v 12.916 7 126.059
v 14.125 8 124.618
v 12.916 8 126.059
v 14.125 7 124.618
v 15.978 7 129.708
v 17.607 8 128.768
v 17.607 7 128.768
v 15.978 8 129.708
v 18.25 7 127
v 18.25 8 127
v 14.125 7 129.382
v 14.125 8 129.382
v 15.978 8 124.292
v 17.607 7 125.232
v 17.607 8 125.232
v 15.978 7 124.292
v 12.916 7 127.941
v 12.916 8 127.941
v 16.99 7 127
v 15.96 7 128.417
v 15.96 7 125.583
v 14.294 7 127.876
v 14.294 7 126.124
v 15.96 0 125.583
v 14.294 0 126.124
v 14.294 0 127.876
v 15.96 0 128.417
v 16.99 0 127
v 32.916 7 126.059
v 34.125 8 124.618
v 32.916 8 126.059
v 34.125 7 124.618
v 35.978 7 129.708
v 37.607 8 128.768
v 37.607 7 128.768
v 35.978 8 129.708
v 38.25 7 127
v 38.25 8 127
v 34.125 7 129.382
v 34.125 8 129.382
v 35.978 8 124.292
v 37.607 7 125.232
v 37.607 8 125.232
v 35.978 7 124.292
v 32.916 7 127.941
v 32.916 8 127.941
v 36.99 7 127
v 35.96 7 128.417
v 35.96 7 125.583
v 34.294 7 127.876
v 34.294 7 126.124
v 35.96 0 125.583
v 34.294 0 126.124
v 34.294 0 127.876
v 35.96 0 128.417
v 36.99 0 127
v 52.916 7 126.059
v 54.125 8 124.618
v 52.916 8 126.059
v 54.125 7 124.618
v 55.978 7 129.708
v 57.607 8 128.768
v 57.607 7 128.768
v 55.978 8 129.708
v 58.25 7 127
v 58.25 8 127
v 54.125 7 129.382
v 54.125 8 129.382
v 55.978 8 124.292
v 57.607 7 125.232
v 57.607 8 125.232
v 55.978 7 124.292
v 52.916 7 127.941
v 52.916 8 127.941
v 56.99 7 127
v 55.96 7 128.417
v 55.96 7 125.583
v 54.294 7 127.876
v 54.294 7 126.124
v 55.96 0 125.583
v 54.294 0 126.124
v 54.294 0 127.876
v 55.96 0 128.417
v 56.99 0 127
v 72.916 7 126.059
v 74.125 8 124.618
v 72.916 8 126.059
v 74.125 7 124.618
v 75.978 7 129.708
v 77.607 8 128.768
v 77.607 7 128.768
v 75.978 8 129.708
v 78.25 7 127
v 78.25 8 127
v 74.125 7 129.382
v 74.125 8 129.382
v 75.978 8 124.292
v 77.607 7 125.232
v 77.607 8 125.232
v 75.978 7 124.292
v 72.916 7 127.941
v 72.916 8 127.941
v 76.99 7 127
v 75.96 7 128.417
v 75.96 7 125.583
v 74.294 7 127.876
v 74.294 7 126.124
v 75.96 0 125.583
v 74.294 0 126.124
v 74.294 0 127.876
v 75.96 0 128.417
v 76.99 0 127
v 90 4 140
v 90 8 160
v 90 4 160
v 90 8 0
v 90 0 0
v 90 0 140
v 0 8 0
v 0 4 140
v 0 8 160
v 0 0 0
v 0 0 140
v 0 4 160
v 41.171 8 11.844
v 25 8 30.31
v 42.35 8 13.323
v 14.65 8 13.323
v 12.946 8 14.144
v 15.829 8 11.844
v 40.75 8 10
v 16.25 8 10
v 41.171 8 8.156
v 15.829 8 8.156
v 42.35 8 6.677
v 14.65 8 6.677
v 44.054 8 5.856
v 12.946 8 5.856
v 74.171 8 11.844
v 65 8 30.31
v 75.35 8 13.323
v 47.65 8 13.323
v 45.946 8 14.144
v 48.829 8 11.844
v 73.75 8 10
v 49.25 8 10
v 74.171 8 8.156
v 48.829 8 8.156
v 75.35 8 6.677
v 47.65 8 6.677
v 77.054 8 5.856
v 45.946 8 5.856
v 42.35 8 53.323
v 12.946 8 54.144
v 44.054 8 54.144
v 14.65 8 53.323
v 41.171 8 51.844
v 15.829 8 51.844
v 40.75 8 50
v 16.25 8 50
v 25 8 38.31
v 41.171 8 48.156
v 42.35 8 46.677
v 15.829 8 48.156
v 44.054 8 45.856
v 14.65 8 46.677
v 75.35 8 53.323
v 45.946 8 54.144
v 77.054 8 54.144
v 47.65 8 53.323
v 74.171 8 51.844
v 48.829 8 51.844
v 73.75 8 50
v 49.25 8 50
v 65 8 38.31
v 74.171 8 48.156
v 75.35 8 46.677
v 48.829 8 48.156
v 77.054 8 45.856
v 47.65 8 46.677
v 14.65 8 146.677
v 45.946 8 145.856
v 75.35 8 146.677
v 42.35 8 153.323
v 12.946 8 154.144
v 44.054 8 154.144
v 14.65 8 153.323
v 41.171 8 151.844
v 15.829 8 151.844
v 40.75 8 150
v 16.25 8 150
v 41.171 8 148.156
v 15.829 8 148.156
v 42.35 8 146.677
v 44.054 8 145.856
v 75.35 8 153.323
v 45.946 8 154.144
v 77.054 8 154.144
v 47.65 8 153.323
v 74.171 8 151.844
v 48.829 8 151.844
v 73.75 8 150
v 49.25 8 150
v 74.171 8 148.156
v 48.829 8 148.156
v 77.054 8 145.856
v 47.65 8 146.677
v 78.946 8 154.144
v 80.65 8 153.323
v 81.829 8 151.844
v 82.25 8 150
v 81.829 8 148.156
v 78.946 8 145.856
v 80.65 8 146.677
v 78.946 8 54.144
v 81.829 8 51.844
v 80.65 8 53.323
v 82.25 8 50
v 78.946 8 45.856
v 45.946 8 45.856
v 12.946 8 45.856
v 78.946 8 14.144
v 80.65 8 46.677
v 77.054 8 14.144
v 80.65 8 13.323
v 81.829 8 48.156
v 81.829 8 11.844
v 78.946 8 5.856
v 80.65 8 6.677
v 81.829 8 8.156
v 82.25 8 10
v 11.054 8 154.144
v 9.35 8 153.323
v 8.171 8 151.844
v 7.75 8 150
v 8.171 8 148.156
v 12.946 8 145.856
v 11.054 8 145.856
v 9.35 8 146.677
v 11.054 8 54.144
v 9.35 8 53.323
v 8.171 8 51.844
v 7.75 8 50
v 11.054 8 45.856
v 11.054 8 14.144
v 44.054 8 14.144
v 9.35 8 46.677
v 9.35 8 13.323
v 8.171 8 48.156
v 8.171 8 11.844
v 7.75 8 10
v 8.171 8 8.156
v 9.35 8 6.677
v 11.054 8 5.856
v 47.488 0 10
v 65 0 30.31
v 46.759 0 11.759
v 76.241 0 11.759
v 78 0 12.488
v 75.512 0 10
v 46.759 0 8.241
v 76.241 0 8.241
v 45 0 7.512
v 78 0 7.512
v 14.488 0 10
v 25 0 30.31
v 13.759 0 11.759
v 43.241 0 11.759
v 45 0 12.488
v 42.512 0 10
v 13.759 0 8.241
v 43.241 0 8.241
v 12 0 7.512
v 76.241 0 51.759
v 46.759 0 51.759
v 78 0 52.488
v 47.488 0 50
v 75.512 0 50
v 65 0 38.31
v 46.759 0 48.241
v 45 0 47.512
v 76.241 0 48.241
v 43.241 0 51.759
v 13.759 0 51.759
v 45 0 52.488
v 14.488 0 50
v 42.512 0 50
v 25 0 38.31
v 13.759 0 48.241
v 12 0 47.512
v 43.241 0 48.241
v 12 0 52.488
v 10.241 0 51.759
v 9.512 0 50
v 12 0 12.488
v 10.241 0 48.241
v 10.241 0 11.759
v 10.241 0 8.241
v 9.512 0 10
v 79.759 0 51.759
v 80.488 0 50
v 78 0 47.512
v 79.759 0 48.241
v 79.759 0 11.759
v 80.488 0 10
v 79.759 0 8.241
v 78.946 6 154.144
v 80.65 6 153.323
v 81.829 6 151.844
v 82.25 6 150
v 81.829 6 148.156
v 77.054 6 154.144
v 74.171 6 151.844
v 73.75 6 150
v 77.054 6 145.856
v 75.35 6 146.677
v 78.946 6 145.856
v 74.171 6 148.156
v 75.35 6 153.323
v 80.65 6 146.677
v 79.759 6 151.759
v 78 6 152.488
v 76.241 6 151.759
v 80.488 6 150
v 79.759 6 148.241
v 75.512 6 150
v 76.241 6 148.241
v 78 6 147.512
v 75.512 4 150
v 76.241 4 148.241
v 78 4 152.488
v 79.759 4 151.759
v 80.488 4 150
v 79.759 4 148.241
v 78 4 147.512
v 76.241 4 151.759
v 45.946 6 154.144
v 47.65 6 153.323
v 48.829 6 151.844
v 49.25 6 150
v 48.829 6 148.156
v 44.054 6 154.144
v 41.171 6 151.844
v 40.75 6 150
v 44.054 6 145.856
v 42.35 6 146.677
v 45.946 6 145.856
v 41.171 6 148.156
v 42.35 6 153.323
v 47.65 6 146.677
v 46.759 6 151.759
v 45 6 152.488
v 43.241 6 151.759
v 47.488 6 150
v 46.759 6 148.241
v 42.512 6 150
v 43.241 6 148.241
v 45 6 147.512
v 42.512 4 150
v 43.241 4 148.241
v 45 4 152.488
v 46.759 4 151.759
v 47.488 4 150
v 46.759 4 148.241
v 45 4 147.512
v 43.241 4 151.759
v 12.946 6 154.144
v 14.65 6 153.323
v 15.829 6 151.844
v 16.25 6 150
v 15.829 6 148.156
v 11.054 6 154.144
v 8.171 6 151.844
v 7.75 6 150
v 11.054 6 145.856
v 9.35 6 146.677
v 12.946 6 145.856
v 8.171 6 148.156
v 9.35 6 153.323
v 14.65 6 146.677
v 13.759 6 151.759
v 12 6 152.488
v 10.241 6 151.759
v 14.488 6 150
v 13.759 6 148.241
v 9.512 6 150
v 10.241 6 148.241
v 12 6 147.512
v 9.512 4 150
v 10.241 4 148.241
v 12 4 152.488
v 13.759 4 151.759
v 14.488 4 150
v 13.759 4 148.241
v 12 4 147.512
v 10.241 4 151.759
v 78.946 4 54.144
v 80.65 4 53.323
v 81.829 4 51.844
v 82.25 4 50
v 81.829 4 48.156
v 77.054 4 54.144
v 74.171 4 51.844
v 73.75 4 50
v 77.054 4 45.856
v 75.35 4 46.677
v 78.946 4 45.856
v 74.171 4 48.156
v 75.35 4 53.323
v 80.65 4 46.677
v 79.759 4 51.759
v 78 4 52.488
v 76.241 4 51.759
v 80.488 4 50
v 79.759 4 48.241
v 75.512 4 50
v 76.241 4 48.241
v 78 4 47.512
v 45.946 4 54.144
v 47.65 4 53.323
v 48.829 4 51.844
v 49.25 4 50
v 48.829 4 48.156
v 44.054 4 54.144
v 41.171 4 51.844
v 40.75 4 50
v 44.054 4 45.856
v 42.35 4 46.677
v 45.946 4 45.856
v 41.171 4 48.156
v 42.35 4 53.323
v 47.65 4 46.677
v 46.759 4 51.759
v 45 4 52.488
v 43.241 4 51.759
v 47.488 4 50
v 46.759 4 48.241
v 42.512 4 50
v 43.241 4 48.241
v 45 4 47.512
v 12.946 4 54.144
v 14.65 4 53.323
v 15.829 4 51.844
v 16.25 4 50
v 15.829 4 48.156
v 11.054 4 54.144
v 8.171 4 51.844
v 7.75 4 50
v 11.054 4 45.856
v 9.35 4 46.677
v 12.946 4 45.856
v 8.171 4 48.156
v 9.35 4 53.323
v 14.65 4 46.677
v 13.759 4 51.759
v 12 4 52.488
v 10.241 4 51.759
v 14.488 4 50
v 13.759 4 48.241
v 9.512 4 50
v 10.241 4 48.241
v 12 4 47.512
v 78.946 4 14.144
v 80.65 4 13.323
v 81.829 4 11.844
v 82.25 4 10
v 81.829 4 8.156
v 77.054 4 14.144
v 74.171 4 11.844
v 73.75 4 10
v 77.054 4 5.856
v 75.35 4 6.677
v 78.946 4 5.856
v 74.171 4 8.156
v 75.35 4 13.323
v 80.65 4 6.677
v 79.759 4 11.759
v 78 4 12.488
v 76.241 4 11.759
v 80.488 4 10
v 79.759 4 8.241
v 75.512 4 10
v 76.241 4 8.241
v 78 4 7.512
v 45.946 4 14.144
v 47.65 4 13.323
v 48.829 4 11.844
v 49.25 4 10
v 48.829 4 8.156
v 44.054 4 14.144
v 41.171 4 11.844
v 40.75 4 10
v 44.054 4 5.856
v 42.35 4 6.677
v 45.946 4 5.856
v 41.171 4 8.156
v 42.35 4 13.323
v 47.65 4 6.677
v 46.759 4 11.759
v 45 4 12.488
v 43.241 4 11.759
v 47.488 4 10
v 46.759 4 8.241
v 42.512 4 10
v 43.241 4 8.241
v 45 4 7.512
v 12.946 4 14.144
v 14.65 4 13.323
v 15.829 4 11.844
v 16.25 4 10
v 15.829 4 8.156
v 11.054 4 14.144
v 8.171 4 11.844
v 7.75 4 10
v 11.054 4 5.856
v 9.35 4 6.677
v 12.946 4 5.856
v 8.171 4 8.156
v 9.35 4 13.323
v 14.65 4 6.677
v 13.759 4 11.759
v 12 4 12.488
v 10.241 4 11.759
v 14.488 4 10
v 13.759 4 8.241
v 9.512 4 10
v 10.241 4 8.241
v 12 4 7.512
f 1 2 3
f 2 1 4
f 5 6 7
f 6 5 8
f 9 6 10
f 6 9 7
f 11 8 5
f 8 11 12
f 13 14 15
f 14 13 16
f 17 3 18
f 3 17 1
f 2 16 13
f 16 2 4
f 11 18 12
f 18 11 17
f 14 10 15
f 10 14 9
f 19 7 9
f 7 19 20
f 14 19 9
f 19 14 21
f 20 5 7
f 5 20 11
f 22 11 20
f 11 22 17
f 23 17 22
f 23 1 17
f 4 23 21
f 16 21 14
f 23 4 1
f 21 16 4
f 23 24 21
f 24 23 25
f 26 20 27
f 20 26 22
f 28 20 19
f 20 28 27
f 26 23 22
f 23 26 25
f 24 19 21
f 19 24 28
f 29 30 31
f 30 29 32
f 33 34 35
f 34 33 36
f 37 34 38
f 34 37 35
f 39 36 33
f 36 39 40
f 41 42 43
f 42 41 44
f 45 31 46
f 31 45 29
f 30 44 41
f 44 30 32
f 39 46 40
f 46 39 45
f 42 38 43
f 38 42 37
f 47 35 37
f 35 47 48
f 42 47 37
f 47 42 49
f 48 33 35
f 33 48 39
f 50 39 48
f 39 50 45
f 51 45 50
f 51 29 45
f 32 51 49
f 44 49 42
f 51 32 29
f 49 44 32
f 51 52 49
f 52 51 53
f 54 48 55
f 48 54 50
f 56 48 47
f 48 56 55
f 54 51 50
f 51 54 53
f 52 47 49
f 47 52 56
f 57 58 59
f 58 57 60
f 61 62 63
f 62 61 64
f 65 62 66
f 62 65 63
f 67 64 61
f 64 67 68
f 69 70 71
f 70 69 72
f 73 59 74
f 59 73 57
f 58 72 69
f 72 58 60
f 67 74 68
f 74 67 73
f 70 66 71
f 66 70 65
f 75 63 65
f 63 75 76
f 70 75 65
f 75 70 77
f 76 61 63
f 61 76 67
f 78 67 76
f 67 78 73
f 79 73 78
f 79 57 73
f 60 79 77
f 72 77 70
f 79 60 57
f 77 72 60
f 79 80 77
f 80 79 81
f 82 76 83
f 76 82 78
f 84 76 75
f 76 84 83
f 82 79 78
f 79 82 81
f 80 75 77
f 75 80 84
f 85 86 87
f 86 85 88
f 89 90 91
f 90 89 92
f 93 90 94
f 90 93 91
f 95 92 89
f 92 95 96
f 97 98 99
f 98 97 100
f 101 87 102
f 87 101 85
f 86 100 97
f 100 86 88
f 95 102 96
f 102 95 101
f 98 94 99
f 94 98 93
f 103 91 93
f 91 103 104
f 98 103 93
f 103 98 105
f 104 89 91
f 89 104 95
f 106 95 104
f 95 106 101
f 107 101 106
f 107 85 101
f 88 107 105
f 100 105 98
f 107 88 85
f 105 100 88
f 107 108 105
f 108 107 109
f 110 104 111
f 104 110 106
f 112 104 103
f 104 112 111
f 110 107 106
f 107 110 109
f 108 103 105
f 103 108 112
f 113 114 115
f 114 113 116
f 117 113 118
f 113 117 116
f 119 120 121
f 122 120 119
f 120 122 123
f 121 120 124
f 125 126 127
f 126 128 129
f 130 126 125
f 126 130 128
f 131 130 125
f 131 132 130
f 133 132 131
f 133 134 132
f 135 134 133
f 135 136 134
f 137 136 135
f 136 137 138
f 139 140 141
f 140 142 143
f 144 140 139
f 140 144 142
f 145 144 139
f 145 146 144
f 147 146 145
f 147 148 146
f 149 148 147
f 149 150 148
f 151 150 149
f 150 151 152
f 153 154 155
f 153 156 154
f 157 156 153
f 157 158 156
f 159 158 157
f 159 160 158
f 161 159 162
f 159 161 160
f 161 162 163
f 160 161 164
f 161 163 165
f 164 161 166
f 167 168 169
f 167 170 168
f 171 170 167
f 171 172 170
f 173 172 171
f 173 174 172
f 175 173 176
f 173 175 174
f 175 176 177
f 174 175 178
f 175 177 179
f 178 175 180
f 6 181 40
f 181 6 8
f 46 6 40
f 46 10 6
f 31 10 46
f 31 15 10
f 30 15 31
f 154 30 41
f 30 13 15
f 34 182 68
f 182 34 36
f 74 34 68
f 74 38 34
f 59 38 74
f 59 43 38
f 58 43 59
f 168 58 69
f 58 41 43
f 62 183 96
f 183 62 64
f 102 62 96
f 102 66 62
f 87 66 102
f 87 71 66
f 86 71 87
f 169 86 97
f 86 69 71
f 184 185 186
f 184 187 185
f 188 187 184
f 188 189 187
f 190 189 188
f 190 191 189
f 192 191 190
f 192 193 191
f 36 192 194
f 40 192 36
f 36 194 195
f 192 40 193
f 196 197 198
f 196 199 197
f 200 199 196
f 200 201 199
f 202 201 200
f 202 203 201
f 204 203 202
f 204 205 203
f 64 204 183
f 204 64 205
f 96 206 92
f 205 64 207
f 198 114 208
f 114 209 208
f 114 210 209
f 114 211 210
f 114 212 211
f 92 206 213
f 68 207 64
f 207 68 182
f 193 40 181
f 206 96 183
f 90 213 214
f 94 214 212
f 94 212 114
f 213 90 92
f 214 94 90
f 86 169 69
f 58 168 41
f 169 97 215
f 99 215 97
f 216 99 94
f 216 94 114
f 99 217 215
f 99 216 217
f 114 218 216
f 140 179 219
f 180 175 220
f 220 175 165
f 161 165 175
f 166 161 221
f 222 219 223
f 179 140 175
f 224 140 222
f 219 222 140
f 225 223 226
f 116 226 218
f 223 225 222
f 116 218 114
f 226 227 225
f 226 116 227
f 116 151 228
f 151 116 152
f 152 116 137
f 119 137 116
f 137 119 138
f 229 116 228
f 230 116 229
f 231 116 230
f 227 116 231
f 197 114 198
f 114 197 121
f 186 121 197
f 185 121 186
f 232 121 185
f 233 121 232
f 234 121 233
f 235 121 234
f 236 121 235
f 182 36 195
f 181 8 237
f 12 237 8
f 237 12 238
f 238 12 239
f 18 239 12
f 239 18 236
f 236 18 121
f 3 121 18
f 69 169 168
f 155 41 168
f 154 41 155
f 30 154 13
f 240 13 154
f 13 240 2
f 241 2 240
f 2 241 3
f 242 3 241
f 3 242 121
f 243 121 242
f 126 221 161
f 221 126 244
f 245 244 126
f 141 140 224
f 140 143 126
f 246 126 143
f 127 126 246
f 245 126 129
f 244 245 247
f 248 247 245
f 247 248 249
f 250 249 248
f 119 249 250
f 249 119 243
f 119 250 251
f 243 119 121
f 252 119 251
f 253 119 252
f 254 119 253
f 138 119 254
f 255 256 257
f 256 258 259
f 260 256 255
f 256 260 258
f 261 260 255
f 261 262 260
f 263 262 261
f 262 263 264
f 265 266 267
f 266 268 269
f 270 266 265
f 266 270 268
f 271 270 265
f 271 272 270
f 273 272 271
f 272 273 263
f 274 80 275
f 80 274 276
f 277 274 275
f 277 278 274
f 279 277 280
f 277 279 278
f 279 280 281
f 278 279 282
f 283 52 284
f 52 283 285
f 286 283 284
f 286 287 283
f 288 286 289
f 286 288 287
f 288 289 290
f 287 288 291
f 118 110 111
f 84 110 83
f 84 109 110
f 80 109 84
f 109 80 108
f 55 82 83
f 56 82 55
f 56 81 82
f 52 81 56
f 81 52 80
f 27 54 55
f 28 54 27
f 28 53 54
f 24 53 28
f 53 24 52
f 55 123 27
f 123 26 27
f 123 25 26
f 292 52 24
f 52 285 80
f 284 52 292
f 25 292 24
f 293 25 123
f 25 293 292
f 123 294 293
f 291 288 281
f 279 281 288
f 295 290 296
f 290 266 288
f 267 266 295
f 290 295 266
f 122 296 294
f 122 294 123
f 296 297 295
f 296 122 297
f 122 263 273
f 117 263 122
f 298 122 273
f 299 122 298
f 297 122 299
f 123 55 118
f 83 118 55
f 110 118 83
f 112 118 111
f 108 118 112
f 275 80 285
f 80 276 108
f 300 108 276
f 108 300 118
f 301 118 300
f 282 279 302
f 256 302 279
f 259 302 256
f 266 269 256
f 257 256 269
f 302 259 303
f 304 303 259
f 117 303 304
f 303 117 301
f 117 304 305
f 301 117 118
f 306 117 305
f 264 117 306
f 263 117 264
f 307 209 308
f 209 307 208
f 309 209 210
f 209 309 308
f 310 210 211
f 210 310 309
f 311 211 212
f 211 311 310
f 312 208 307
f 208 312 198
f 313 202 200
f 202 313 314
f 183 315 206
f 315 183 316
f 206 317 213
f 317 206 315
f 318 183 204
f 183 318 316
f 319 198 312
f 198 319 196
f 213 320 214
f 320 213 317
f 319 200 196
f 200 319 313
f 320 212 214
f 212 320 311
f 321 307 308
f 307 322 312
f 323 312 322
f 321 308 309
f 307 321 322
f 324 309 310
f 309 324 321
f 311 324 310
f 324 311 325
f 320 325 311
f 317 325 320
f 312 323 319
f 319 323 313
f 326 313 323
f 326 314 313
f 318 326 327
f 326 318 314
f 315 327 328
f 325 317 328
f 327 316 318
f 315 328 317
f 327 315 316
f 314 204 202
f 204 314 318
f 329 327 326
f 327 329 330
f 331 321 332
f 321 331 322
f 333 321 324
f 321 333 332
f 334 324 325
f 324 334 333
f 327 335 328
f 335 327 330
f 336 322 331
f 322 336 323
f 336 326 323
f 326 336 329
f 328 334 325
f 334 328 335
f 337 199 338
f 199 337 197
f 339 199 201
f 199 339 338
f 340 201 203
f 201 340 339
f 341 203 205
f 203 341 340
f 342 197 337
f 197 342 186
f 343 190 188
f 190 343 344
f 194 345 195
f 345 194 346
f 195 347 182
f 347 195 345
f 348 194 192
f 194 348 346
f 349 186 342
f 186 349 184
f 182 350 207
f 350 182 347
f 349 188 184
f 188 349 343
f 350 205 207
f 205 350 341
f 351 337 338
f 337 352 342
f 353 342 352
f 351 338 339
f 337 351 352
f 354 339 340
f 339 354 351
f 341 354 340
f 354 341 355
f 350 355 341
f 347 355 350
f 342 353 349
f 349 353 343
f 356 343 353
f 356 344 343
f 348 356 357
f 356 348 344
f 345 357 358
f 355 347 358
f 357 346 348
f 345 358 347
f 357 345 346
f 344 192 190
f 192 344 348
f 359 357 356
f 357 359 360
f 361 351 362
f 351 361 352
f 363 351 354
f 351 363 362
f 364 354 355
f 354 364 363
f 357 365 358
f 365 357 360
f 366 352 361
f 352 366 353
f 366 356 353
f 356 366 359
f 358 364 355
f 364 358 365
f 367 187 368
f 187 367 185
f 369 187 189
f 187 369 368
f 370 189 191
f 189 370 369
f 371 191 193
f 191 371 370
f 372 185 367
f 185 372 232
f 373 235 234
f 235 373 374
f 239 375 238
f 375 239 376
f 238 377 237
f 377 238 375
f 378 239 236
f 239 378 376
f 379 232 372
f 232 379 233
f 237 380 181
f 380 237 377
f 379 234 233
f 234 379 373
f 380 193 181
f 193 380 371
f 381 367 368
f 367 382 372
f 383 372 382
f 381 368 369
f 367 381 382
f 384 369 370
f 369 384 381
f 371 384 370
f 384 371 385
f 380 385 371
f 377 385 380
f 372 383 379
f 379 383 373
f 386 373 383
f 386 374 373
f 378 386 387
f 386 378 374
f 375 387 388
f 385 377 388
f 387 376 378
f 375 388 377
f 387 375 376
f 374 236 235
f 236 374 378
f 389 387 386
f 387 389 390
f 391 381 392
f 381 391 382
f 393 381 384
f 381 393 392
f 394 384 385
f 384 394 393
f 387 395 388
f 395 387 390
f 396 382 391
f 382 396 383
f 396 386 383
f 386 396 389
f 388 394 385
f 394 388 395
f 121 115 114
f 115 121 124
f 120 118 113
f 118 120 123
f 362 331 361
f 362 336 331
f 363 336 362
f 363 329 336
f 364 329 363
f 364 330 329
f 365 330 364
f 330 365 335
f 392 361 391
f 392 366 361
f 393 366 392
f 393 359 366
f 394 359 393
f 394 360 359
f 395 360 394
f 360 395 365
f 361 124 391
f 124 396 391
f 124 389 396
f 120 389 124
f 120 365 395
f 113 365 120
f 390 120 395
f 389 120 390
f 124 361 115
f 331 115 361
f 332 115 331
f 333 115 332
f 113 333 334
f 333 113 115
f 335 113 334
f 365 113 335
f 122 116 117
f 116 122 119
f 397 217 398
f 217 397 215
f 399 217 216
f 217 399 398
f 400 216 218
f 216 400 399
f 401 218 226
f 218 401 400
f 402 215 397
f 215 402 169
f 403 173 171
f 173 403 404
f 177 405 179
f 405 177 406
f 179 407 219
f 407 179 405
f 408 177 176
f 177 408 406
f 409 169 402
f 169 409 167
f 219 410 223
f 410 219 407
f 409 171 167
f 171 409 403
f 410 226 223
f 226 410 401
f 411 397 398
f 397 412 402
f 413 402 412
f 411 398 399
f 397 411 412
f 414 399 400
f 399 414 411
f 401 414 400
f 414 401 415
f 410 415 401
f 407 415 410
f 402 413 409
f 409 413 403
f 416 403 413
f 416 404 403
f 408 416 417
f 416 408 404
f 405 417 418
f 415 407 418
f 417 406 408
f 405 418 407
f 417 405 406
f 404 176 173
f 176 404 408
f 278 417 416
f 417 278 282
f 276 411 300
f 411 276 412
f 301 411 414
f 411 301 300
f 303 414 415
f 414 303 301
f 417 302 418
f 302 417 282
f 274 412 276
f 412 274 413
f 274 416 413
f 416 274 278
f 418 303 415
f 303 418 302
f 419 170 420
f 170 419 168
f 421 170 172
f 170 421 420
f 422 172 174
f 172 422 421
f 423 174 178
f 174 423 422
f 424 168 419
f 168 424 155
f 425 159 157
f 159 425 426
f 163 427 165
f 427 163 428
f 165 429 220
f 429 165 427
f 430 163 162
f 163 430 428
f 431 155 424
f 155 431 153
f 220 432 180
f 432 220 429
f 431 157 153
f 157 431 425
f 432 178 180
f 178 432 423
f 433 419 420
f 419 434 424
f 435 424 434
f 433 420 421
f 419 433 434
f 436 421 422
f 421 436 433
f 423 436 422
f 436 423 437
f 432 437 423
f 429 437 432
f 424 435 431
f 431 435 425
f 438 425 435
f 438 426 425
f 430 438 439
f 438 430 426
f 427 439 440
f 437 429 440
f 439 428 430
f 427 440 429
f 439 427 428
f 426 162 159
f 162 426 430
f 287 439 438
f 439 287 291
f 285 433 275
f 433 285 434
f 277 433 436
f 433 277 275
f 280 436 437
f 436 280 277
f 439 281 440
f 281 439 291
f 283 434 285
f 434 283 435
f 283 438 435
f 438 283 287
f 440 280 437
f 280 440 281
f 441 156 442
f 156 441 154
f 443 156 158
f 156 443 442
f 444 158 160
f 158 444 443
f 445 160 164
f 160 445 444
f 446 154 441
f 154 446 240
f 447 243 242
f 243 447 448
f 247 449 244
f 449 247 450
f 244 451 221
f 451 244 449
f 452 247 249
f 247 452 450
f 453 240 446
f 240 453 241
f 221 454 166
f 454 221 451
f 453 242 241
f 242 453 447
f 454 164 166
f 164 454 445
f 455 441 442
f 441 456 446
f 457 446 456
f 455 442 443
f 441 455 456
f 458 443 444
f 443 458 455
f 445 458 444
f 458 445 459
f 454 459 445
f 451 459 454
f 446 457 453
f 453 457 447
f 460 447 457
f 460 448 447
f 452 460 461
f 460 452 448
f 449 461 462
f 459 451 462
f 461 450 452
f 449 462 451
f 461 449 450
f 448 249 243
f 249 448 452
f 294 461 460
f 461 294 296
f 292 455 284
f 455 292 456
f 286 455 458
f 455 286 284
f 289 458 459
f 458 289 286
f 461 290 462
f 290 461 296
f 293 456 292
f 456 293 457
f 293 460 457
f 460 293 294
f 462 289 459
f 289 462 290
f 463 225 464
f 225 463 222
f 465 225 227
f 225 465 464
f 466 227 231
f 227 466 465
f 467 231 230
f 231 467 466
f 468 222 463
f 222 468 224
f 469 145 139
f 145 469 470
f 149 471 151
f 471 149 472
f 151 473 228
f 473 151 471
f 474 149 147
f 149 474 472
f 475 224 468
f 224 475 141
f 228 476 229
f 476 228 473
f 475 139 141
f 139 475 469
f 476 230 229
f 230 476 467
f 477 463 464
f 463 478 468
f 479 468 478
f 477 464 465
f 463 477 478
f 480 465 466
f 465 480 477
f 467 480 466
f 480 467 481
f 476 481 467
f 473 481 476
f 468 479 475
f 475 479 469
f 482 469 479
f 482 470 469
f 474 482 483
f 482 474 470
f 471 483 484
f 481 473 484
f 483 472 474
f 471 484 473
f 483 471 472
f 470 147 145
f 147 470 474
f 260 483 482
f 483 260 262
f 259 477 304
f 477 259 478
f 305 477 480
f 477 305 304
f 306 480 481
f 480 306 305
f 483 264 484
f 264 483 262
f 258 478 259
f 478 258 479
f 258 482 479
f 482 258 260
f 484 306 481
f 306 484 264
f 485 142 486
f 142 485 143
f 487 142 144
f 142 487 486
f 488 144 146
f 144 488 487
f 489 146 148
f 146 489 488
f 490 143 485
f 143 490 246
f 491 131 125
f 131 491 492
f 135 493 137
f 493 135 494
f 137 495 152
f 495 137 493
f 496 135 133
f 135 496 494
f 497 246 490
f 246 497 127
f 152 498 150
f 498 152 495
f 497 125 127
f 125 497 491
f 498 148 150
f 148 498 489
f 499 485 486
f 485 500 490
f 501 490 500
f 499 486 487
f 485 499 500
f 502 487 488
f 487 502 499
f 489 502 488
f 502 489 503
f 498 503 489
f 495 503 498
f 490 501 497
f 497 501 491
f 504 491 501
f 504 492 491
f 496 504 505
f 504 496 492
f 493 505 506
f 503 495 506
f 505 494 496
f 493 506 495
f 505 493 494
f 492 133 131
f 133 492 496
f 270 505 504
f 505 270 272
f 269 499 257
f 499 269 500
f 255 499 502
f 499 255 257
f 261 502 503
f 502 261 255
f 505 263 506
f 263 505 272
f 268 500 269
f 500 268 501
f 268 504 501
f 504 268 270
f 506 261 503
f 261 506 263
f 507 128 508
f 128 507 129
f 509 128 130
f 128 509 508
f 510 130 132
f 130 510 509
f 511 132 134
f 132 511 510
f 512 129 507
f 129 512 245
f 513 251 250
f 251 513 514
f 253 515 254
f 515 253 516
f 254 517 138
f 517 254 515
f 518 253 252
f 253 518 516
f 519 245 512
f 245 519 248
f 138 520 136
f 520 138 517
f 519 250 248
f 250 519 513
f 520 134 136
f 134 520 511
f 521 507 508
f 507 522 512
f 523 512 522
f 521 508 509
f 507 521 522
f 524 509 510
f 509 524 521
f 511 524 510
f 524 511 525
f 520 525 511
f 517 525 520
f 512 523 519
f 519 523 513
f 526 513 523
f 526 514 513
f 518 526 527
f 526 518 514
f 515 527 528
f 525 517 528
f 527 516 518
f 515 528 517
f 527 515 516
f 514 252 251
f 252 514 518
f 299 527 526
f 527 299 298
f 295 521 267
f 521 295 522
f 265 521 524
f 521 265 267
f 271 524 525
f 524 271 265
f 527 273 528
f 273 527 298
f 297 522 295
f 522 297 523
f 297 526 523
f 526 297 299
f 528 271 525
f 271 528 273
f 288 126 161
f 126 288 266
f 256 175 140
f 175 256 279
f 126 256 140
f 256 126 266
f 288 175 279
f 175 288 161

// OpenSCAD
// file: grid.scad
module grid(gridX=100,gridY=100,borderX=10,borderY=10,meshSolid=.5,meshSpace=2,thickness=1.5)
{
//-------------------------------------------------
	meshX=gridX-(borderX*2);
	meshY=gridY-(borderY*2);
	nX=meshX/(meshSolid+meshSpace);
	nY=meshY/(meshSolid+meshSpace);

	difference() {
		cube (size=[gridX,gridY,thickness],center=true);
		cube (size=[meshX,meshY,thickness],center=true);
		}

	for (i=[0:nX]) {
	 	 translate([-(meshX/2)+i*(meshSolid+meshSpace),-meshY/2,-thickness/2]) cube(size=[meshSolid,meshY,thickness],center=false);
		 }

	for (i=[0:nY]) {
	 	translate([-meshX/2,-(meshY/2)+i*(meshSolid+meshSpace),-thickness/2]) cube(size=[meshX,meshSolid,thickness],center=false);

         }

}   

grid();
// main file
use <MCAD/nuts_and_bolts.scad>;
use <grid.scad>;

module extension_mount(wi=90)
{
    difference(){
       extension_mount_body(wi);
       extension_mount_cuts();
       }
}

module extension_mount_body(wi)
{
	translate([0,4,0]) cube([wi,4,20]);
    %translate([78,6,10]) rotate([90,0,0]) boltHole(5,"MM", 12);
    %translate([45,6,10]) rotate([90,0,0]) boltHole(5,"MM", 12);
    %translate([12,6,10]) rotate([90,0,0]) boltHole(5,"MM", 12);
}

module extension_mount_cuts()
{
    translate([78,6,10]) rotate([90,0,0]) boltHole(5,"MM", 12);
    translate([45,6,10]) rotate([90,0,0]) boltHole(5,"MM", 12);
    translate([12,6,10]) rotate([90,0,0]) boltHole(5,"MM", 12);	
}




module din_mount_cuts()
{
	translate([12.5,7,0]) rotate([90,0,0]) boltHole(3,"MM", 12);
	translate([32.5,7,0]) rotate([90,0,0]) boltHole(3,"MM",12);
    translate([52.5,7,0]) rotate([90,0,0]) boltHole(3,"MM",12);
    translate([72.5,7,0]) rotate([90,0,0]) boltHole(3,"MM",12);
}


module din_mount_body()
{
    translate([-3,0,-5]) cube([90,8,10]);
	%translate([12.5,7,0]) rotate([90,0,0]) boltHole(3,"MM", 12);
	%translate([32.5,7,0]) rotate([90,0,0]) boltHole(3,"MM",12);
    %translate([52.5,7,0]) rotate([90,0,0]) boltHole(3,"MM",12);
    %translate([72.5,7,0]) rotate([90,0,0]) boltHole(3,"MM",12);
}

module din_mount()
{
	difference(){
           din_mount_body();
           din_mount_cuts();
           }
}

module miwi_mount_body()
{
	cube([90,8,60]);
    %translate([78,4,50]) rotate([90,0,0]) boltHole(5,"MM", 12);
    %translate([45,4,50]) rotate([90,0,0]) boltHole(5,"MM", 12);
    %translate([12,4,50]) rotate([90,0,0]) boltHole(5,"MM", 12);
    %translate([78,4,10]) rotate([90,0,0]) boltHole(5,"MM", 12);
    %translate([45,4,10]) rotate([90,0,0]) boltHole(5,"MM", 12);
    %translate([12,4,10]) rotate([90,0,0]) boltHole(5,"MM", 12);
   // %translate([10,8,26.31+6])  rotate([90,0,0]) cube([40,6,8]);
   translate([0,0,15]) cube([90,8,60]);
  // %translate([0,8,75]) rotate([90,0,0]) cube([40,40,40]);
   // Bottom Shelf
   translate([0,8,74]) rotate([90,0,0]) cube([90,8,8]);
 //  translate([0,-10,75]) rotate([0,90,0]) cube([10,10,90]);
 //  translate([0,-15,75]) rotate([0,90,0]) cube([5,5,90]);
   //BSU Back Wall
   translate([0,0,80]) cube([90,8,44]);
  
   translate([3,0,145-18]) rotate([0,0,0]) din_mount();
   translate([0,0,132]) cube([90,8,8]);
   translate([0,0,140]) rotate([0,0,0]) extension_mount();
   // Top Shelf
   //translate([0,8,180]) rotate([90,0,0]) cube([90,8,120]);
   //translate([0,-52,131]) rotate([90,0,90]) grid(120,111);
   //translate([90,-52,131]) rotate([90,0,90]) grid(120,111);
}   


module miwi_mount_cuts()
{
 translate([78,4,50]) rotate([90,0,0]) boltHole(5,"MM", 12);
 translate([45,4,50]) rotate([90,0,0]) boltHole(5,"MM", 12);
 translate([12,4,50]) rotate([90,0,0]) boltHole(5,"MM", 12);
 translate([78,4,10]) rotate([90,0,0]) boltHole(5,"MM", 12);
 translate([45,4,10]) rotate([90,0,0]) boltHole(5,"MM", 12);
 translate([12,4,10]) rotate([90,0,0]) boltHole(5,"MM", 12);
 translate([25,8.1,24.31+6])  rotate([90,0,0]) cube([40,8,10]);
}

module miwi_mount()
{
	difference(){
          miwi_mount_body();
	      miwi_mount_cuts();
          }

   
}

miwi_mount();
